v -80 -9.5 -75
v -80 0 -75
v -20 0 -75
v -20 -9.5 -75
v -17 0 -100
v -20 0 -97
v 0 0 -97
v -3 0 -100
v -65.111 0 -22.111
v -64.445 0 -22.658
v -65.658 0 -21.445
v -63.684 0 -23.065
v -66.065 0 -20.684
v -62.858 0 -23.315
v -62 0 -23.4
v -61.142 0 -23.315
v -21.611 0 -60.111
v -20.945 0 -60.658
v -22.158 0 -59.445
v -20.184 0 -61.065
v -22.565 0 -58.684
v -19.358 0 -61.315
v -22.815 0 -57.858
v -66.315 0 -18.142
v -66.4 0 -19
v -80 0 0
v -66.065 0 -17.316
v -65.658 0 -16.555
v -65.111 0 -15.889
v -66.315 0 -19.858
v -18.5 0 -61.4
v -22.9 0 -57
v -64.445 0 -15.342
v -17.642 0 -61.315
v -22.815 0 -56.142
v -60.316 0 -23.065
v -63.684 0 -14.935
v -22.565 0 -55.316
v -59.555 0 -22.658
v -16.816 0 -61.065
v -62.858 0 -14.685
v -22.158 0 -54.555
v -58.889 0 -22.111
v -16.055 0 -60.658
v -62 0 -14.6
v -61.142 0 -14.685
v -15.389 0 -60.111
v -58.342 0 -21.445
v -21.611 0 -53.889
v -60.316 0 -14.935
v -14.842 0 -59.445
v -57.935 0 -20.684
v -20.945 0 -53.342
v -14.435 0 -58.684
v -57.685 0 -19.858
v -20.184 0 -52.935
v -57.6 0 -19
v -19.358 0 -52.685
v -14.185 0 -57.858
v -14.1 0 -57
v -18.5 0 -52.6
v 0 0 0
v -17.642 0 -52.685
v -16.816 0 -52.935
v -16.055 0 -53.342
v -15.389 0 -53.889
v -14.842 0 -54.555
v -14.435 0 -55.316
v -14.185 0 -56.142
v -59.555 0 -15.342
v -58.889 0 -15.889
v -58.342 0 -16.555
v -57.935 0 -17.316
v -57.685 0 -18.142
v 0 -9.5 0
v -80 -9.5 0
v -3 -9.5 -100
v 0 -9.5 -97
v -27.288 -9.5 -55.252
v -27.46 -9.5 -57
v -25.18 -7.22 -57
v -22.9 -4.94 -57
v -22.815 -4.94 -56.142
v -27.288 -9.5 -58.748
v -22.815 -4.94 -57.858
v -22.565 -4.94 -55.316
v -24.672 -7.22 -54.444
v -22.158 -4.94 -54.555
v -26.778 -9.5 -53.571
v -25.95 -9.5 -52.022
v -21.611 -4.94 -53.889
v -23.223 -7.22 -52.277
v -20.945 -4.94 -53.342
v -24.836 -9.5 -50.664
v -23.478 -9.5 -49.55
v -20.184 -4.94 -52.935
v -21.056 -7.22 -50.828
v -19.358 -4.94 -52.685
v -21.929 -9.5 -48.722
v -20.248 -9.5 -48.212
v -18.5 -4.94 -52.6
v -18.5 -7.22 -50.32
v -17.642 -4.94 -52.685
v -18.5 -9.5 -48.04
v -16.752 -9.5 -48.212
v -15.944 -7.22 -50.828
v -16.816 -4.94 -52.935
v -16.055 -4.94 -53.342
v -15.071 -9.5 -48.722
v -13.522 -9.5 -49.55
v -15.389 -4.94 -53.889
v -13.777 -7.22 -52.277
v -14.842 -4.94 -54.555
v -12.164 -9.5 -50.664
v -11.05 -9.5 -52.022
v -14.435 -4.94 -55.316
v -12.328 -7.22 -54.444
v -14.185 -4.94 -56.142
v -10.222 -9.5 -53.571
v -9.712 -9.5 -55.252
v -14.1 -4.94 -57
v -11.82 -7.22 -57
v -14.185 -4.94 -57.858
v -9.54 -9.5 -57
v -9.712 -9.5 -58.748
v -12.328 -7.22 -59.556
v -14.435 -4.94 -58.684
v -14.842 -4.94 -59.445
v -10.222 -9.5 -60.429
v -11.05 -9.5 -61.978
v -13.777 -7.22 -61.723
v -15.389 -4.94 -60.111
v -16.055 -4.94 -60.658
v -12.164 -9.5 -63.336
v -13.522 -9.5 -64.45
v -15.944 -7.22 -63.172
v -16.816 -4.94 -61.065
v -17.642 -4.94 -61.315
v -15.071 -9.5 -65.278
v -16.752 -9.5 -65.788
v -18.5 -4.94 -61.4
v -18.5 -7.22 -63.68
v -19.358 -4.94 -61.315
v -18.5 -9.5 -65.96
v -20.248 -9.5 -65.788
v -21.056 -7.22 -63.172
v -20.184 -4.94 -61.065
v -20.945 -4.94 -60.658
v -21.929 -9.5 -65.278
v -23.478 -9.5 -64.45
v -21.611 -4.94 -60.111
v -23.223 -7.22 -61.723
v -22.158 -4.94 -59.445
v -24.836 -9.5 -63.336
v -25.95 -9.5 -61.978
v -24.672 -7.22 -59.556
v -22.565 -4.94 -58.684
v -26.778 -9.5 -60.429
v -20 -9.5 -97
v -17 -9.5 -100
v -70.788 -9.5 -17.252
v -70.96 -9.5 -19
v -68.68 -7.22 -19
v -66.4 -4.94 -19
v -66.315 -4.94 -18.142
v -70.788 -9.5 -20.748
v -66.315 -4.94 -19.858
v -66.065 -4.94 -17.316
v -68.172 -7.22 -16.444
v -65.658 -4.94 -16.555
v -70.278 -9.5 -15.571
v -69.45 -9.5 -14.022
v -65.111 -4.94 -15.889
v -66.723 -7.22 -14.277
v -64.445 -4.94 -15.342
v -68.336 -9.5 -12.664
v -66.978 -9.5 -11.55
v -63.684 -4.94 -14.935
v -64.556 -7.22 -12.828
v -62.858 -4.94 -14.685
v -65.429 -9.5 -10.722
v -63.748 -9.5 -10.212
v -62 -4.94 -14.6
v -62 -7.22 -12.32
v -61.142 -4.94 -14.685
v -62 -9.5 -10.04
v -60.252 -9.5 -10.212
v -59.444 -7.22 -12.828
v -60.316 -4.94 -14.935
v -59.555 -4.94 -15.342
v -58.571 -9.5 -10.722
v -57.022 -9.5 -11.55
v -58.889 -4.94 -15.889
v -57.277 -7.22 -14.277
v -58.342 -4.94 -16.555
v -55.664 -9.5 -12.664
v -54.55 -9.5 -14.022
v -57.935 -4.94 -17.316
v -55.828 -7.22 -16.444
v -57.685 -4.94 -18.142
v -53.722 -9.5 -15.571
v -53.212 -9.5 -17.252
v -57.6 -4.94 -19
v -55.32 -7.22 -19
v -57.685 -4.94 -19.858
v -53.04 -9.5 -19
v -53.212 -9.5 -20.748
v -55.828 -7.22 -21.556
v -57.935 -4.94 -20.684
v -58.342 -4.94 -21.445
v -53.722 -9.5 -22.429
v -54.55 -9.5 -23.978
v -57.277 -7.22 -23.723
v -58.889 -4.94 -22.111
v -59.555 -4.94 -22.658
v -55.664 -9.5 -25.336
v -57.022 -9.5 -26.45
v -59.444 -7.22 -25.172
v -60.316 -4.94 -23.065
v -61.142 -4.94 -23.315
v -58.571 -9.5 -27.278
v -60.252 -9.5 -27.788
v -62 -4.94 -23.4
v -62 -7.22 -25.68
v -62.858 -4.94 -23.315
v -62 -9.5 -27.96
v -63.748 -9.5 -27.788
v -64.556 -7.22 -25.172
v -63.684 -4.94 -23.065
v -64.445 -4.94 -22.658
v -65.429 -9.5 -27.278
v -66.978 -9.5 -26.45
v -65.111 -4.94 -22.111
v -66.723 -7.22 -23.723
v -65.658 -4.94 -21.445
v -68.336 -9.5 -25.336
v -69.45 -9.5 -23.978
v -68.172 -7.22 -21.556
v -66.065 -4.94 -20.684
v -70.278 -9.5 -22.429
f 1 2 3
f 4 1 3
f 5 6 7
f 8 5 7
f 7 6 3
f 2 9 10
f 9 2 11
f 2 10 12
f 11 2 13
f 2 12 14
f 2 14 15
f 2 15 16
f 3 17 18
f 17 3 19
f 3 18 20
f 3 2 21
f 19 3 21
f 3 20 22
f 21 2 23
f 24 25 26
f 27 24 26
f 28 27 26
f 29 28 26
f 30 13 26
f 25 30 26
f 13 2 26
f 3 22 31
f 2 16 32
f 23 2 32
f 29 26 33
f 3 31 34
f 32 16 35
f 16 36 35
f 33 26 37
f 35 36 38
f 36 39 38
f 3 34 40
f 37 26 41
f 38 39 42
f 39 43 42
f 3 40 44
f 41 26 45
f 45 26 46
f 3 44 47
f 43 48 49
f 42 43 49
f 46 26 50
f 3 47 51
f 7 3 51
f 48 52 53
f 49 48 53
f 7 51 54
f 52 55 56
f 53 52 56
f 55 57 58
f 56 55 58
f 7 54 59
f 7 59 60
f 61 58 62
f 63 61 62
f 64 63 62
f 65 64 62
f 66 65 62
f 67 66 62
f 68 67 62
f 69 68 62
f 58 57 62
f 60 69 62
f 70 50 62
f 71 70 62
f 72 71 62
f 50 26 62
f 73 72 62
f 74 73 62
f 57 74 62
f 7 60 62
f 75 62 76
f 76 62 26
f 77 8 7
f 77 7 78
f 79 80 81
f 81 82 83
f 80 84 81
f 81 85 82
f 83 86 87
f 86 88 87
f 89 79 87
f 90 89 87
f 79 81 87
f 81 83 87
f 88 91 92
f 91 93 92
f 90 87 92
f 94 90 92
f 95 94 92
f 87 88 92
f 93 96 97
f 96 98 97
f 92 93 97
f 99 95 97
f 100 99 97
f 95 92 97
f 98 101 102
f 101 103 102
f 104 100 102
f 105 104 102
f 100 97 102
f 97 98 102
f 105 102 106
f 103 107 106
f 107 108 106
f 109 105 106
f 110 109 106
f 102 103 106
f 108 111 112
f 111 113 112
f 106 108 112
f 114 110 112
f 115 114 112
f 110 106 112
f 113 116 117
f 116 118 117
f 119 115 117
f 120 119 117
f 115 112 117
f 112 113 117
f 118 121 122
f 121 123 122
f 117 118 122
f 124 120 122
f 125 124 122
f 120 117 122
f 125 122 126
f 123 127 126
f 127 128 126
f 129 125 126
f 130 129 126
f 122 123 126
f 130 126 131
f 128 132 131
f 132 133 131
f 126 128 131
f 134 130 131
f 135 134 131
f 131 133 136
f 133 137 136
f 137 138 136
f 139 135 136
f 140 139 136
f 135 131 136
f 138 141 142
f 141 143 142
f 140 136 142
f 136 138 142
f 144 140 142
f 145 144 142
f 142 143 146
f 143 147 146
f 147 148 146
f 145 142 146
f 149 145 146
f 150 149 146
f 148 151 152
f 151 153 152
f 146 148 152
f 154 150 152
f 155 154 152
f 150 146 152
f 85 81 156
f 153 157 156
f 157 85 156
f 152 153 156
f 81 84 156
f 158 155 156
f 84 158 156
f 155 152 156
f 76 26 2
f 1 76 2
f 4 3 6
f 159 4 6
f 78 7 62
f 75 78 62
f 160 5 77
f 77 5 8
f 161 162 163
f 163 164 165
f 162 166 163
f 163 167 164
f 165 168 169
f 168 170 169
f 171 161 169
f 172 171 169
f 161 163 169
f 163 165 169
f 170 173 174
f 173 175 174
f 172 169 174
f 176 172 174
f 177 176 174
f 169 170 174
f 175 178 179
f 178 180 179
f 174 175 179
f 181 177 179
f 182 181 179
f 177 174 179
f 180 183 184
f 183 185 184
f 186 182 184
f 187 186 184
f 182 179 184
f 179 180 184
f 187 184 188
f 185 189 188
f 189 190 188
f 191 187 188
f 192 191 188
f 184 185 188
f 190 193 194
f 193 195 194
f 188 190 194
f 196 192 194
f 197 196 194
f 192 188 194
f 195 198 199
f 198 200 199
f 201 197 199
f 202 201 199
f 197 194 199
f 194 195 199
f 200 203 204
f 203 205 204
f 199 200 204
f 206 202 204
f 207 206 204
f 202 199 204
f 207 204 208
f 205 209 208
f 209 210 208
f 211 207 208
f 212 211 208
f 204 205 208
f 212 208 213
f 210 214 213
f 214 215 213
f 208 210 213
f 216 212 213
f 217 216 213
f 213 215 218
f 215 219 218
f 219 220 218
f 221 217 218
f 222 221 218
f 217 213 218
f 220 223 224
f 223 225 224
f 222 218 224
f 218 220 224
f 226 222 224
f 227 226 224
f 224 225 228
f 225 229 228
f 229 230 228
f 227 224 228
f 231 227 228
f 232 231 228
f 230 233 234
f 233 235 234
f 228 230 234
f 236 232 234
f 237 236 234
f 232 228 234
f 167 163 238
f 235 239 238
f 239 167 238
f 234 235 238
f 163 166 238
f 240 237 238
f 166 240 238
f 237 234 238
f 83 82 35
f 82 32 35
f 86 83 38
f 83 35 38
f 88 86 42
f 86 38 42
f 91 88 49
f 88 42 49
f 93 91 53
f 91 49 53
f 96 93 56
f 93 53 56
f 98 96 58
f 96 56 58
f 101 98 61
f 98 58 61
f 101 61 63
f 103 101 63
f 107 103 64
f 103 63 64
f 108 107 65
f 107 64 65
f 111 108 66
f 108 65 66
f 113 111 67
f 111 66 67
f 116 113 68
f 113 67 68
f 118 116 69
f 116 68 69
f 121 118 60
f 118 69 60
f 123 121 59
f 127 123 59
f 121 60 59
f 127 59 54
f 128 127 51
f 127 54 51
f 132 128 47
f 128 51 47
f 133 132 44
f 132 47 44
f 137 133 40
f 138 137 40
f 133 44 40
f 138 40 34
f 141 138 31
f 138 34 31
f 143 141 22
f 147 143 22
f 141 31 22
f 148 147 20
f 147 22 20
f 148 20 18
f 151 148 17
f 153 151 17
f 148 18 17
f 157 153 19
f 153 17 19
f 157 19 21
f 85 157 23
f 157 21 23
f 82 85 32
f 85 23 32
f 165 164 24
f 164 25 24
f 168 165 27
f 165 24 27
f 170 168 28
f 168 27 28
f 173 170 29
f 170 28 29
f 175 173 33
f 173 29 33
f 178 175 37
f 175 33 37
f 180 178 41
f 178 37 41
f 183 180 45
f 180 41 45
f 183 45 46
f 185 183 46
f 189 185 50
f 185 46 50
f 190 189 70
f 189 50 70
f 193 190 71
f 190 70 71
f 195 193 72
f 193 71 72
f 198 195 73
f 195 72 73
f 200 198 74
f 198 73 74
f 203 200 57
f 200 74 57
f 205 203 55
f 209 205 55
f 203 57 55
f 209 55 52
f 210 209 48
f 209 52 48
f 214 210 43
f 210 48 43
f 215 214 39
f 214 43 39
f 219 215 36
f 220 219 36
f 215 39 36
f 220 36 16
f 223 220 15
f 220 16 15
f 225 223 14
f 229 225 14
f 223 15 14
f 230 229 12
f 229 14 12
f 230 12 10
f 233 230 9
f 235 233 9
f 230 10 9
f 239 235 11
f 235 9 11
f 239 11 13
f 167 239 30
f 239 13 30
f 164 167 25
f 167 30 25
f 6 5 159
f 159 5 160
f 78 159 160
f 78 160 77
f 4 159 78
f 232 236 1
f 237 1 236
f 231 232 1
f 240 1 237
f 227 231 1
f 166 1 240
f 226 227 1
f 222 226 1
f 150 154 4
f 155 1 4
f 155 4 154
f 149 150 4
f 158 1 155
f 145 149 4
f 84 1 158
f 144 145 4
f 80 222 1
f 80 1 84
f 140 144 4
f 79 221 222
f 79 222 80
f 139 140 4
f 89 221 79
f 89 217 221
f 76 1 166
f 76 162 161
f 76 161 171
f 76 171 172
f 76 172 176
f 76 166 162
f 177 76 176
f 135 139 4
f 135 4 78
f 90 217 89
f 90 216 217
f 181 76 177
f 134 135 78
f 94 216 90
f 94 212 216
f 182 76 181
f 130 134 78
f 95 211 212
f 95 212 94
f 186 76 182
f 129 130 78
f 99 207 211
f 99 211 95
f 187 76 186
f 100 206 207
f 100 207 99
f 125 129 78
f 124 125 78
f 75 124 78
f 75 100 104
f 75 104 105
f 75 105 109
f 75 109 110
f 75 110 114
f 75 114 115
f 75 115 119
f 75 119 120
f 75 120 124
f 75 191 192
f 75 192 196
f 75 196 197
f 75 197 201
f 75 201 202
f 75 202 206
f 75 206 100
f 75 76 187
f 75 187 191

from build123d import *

# Parameters (mm, degrees)
F1_DEPTH       = 9.5
F3_D           = 8.8
F3_CSINK_D     = 17.92
F3_CSINK_ANGLE = 90
F4_SIZE        = 3


with BuildPart() as f1:
    # F0 (on Front) → F1 (new body)
    with BuildSketch(Plane.XZ):
        Polygon((0, -100), (0, 0), (-80, 0), (-80, -75), (-20, -75), (-20, -100), align=None)
    extrude(amount=F1_DEPTH)

    # F3 (through all)
    with Locations(Plane.XZ.offset(9.5)):
        with Locations((-62, -19), (-18.5, -57)):
            CounterSinkHole(F3_D / 2, F3_CSINK_D / 2, counter_sink_angle=F3_CSINK_ANGLE)

    # F4
    f4_edges = [f1.edges().sort_by_distance(p)[0] for p in [
        (-20, -4.75, -100),
        (0, -4.75, -100),
    ]]
    chamfer(f4_edges, length=F4_SIZE)


solid = f1.part
